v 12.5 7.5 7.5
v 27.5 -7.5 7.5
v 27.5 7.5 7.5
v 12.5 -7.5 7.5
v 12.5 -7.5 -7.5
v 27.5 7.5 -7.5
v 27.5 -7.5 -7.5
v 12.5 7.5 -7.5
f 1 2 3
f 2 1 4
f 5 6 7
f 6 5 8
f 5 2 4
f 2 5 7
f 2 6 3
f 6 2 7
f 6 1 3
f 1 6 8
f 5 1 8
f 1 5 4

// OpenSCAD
// Test that mixing 2D and 3D objects in minkowski will promote the
// 2D object to 3D and then properly perform the minkowski sum.
translate([-20, 0, 0]) minkowski() {
    square([15, 15], center=true);                          // 2D
    cylinder(d=10, h=10);                                   // 3D
}

// This promotion should hold regardless of ordering, so test that.
translate([20, 0, 0]) minkowski() {
    cube([15, 15, 15], center=true);                        // 3D
    circle(d=10);                                           // 2D
}
